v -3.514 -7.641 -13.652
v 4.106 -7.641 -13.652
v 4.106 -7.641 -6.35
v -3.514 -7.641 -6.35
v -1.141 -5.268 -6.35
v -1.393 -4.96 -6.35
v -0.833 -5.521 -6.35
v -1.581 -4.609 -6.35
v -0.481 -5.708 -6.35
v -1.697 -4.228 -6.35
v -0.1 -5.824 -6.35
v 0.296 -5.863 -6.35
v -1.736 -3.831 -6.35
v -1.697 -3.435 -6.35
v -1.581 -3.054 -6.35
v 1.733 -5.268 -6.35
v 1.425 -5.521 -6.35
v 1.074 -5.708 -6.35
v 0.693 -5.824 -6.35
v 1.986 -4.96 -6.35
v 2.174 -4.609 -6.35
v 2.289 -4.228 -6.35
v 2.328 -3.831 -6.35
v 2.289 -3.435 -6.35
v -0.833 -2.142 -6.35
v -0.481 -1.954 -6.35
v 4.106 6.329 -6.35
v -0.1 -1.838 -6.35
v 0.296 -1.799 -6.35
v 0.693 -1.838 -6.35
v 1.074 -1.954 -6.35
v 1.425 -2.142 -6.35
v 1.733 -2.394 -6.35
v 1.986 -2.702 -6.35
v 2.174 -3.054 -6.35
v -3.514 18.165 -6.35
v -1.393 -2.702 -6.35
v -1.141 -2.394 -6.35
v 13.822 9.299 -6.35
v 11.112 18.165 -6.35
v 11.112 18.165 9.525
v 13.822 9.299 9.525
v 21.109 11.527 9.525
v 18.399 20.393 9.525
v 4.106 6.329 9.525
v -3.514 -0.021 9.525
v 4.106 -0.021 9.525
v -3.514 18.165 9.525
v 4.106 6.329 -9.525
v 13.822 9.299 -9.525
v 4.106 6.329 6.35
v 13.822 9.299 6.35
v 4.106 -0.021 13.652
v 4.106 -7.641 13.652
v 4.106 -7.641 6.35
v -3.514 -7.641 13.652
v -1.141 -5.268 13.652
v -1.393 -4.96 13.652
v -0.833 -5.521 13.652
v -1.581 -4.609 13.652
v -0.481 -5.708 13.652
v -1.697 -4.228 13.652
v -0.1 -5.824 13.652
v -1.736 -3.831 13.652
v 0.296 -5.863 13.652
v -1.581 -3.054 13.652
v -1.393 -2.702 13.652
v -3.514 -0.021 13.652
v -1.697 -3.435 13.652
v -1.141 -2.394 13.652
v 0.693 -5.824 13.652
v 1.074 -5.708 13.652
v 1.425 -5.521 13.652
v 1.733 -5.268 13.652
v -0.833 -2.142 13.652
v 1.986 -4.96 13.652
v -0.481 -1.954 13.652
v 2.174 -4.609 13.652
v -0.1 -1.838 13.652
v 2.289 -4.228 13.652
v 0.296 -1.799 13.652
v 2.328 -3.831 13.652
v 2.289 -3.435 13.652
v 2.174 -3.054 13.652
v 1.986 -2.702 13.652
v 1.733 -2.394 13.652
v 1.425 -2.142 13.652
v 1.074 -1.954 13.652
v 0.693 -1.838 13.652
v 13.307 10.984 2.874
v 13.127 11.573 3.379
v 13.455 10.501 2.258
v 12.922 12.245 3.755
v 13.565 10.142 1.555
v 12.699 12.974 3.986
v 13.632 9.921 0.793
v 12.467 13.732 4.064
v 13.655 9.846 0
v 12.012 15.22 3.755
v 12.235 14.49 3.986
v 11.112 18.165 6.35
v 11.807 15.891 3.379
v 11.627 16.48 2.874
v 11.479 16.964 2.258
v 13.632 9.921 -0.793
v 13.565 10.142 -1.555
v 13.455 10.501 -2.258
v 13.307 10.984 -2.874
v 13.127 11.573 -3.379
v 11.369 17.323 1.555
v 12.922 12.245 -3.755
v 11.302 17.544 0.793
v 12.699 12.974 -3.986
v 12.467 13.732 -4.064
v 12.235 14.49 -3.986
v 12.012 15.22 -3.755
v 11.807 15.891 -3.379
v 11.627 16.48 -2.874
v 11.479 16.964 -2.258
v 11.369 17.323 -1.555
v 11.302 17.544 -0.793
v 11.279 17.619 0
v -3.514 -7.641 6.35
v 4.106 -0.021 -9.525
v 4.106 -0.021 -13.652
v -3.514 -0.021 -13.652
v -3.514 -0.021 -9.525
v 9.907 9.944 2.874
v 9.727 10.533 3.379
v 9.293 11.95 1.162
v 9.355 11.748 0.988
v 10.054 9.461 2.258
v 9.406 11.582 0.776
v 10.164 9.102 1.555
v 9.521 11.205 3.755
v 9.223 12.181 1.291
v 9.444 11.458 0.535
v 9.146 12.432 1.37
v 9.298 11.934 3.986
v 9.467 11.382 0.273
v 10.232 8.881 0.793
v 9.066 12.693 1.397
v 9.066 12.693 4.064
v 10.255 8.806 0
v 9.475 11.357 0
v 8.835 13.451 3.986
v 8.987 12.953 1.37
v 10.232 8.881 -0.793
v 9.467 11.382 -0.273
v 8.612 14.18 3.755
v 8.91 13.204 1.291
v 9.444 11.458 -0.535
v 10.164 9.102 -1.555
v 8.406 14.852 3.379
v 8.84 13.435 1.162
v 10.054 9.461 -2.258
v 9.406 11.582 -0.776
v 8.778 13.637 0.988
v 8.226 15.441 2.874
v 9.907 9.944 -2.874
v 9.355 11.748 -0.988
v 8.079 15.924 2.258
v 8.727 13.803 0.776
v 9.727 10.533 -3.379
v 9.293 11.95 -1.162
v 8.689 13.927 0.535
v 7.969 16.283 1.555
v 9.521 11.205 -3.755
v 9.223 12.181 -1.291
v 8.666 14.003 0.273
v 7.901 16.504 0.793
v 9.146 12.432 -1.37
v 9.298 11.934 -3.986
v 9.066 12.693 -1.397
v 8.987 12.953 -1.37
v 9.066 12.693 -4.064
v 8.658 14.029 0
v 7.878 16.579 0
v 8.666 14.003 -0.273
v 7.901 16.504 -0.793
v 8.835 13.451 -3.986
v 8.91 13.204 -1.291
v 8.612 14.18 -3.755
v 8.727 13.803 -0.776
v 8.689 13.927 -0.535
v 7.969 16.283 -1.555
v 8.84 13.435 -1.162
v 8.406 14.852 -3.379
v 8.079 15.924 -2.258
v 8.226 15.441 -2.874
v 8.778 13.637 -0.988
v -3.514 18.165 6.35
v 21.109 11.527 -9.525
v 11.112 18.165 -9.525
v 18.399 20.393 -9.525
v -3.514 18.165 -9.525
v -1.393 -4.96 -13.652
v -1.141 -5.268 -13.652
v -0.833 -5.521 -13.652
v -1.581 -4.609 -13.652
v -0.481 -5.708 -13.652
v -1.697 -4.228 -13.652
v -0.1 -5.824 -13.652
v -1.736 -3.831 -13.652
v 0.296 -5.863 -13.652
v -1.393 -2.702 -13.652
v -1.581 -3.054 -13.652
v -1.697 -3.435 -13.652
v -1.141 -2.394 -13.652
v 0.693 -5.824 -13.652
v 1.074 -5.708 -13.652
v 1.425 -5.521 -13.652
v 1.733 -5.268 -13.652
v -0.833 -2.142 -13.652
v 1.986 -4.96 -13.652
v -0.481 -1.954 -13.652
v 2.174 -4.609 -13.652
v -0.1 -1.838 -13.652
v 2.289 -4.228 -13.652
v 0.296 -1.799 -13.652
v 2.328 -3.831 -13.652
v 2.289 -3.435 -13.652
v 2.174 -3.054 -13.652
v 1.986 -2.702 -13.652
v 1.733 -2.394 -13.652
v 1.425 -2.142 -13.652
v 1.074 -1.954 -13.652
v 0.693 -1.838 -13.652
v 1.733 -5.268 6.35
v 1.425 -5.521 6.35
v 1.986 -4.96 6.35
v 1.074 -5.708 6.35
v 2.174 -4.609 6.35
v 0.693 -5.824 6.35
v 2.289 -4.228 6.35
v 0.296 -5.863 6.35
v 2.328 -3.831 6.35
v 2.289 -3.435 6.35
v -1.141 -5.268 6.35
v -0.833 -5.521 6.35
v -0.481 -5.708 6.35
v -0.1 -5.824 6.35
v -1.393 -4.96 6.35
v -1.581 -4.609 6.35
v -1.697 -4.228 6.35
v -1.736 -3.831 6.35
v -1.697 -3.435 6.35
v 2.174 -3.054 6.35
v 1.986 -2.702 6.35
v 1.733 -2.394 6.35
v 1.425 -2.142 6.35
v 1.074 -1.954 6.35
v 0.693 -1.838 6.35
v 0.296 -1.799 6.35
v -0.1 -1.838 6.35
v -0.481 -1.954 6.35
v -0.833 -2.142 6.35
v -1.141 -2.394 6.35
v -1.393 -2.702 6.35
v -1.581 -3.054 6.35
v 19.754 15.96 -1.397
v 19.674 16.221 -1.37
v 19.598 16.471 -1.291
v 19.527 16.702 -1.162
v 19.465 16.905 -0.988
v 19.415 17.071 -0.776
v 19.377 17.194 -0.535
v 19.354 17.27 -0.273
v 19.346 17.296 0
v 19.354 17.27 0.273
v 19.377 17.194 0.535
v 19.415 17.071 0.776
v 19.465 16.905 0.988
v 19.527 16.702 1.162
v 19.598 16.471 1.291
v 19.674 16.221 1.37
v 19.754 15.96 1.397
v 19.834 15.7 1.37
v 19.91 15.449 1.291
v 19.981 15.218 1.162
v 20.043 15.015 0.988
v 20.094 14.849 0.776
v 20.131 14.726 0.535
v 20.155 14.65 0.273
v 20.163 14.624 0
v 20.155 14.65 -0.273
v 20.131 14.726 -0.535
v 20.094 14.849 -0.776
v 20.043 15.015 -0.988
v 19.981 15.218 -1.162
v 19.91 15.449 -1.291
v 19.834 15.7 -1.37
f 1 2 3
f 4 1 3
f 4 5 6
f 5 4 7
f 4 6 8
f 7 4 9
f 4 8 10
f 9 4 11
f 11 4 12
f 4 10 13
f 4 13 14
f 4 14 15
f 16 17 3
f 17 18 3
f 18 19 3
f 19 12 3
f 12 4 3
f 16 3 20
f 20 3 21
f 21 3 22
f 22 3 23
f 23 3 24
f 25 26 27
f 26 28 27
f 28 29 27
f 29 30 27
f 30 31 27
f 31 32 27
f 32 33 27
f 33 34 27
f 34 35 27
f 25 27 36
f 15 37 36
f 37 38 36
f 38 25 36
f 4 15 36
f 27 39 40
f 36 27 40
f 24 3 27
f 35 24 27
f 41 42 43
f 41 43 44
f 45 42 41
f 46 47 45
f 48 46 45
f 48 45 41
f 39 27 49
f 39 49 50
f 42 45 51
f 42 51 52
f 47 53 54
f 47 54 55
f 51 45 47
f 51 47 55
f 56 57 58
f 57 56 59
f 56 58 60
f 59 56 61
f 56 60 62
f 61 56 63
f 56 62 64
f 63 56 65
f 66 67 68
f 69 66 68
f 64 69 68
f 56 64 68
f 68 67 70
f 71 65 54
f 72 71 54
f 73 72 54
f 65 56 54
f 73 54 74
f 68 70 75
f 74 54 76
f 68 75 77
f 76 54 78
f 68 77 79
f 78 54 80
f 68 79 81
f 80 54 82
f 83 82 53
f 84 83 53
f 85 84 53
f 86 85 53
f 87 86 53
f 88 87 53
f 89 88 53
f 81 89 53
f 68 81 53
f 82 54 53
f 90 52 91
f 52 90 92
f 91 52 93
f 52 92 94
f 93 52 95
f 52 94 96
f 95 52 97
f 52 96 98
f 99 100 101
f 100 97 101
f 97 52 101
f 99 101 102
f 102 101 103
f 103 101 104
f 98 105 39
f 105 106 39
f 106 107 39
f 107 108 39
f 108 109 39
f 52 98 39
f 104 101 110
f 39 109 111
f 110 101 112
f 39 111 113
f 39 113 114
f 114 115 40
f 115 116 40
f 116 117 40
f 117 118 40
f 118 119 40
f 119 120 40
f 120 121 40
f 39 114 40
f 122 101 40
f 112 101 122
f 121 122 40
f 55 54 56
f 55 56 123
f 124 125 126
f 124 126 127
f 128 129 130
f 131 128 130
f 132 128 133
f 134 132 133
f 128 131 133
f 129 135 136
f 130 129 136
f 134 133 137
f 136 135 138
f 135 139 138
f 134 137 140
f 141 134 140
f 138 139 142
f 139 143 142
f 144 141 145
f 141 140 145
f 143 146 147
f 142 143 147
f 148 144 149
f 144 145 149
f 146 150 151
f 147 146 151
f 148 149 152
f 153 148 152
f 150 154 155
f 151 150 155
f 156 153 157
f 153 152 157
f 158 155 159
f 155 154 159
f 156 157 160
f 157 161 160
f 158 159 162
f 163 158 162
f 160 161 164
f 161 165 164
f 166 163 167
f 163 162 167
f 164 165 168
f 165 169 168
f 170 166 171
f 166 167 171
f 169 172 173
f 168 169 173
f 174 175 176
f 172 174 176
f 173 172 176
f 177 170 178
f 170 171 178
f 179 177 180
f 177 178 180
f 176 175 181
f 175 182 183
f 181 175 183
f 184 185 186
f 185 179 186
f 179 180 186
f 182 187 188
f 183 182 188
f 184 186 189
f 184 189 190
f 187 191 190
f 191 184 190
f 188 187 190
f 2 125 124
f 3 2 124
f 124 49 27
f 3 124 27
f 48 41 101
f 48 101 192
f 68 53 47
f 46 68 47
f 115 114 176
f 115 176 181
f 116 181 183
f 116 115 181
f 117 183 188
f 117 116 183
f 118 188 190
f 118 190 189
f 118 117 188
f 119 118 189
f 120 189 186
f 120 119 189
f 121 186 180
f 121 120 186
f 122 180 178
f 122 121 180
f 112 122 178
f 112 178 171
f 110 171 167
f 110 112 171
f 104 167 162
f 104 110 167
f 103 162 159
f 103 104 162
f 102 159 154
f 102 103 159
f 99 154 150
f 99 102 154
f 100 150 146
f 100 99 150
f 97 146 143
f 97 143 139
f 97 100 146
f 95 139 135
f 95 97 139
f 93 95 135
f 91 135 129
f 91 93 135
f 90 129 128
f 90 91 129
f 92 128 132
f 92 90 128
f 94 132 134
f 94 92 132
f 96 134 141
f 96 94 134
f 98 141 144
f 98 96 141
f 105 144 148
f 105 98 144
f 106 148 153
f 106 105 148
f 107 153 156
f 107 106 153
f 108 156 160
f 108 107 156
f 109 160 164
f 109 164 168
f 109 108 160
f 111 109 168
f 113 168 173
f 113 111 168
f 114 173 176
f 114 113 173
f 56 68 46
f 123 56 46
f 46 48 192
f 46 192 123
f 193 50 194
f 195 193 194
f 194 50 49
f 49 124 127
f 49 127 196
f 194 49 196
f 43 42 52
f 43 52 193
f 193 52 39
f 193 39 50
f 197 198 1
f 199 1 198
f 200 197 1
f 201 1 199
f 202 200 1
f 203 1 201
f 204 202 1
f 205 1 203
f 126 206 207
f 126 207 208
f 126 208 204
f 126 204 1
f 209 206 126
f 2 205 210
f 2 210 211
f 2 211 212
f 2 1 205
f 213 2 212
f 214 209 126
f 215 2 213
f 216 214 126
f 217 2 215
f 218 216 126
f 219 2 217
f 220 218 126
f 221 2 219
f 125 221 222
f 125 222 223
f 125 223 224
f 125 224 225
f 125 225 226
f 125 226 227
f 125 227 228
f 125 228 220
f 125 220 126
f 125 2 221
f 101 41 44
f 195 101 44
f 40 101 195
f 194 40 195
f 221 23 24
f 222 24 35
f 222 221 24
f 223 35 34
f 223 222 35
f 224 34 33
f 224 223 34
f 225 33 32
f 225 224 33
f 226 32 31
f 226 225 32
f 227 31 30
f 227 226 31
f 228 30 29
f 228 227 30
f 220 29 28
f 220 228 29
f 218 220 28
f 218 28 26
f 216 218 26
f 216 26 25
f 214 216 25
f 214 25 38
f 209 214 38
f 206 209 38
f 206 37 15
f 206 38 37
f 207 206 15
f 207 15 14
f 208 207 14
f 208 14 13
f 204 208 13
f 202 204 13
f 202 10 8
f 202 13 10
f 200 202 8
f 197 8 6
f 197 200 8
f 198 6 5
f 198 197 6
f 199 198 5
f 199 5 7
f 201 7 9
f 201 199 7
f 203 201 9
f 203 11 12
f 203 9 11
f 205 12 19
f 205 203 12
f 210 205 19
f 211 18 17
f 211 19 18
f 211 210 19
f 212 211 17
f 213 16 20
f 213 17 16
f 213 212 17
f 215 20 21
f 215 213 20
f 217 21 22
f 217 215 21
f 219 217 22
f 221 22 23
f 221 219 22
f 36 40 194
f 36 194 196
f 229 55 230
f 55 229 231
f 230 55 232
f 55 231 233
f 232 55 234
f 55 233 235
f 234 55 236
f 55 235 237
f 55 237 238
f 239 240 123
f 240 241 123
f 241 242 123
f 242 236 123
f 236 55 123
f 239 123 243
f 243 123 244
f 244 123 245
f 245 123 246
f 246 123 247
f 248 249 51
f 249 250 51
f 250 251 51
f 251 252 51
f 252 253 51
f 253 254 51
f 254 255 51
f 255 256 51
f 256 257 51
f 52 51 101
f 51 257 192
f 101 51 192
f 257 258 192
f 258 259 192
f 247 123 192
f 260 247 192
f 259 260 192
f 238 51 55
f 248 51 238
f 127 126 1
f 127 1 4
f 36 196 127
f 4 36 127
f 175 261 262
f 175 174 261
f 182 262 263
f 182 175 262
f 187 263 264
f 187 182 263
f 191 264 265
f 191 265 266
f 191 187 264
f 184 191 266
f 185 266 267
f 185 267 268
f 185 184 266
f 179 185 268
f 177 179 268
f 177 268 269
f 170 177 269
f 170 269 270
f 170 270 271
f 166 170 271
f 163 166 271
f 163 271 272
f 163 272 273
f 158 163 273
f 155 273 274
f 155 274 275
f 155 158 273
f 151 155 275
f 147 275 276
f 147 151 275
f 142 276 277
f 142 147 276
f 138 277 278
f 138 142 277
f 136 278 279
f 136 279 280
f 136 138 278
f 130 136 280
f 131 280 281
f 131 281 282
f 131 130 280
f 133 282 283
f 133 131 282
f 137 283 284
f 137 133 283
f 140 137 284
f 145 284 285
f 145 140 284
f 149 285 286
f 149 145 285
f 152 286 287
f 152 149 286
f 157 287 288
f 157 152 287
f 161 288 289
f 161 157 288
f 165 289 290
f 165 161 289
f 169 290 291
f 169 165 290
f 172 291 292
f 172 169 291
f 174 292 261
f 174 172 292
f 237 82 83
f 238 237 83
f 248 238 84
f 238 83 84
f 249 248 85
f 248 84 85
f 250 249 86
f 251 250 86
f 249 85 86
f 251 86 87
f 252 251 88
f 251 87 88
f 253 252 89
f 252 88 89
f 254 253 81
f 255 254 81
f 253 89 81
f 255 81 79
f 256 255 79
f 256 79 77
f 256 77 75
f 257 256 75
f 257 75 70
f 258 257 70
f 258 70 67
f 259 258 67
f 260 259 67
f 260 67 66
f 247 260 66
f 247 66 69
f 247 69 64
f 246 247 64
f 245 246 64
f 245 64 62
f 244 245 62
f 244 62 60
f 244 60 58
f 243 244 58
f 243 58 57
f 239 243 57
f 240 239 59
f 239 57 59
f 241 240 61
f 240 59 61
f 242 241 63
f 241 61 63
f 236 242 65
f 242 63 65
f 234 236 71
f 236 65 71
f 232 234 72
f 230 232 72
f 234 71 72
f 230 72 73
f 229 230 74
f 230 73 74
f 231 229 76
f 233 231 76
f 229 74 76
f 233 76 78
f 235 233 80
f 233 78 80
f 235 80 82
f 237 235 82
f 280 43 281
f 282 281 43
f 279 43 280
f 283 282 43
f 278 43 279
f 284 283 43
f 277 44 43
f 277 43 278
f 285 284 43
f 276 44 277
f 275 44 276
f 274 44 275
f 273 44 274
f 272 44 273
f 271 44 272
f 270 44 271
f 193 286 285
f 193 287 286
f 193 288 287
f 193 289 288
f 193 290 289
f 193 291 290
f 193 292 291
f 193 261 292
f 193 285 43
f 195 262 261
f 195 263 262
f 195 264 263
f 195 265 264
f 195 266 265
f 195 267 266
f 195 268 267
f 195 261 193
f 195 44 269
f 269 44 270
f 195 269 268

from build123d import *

# Parameters (mm, degrees)
BOSS_EXTRUDE1_DEPTH     = 9.525
SKETCH2_W               = 12.7
SKETCH2_H               = 25.806397913
CUT_EXTRUDE1_DEPTH      = 14.822389654
CUT_EXTRUDE1_DEPTH_BACK = 4.513666667
SKETCH3_W               = 19.05
SKETCH3_H               = 9.271
SKETCH3_R               = 1.397
BOSS_EXTRUDE2_DEPTH     = 7.62
SKETCH3_3_R             = 4.064
SKETCH3_3_R_2           = 1.397
BOSS_EXTRUDE3_DEPTH     = 3.556
SKETCH4_W               = 4.1275
SKETCH4_H               = 7.62
BOSS_EXTRUDE4_DEPTH     = 7.62
SKETCH5_R               = 2.032
CUT_EXTRUDE2_DEPTH      = 20.0025


with BuildPart() as part:
    # Sketch1 → Boss-Extrude1 (new body, symmetric)
    with BuildSketch(Plane.XY):
        Polygon((-3.513666667, -7.641166667), (4.106333333, -7.641166667), (4.106333333, 6.328833333), (13.822389654, 9.299329853), (11.111811579, 18.165231246), (-3.513666667, 18.165231246), align=None)
    extrude(amount=BOSS_EXTRUDE1_DEPTH, both=True)

    # Sketch2 → Cut-Extrude1 (cut, two sides)
    with BuildSketch(Plane(origin=(0, 0, 0), x_dir=(0, 0, -1), z_dir=(1, 0, 0))) as cut_extrude1_sk:
        with Locations((0, 5.26203229)):
            Rectangle(SKETCH2_W, SKETCH2_H)
    extrude(amount=CUT_EXTRUDE1_DEPTH, mode=Mode.SUBTRACT)
    extrude(cut_extrude1_sk.sketch, amount=-CUT_EXTRUDE1_DEPTH_BACK, mode=Mode.SUBTRACT)

    # Sketch3 → Boss-Extrude2 (add)
    with BuildSketch(Plane(origin=(15.24089464, 4.659609104, 0), x_dir=(0, 0, -1), z_dir=(0.956304756, 0.292371705, 0))):
        with Locations((0, 9.48721774)):
            Rectangle(SKETCH3_W, SKETCH3_H)
        with Locations((0, 9.48721774)):
            Circle(SKETCH3_R, mode=Mode.SUBTRACT)
    extrude(amount=BOSS_EXTRUDE2_DEPTH)

    # Sketch3<3> → Boss-Extrude3 (add)
    with BuildSketch(Plane(origin=(15.24089464, 4.659609104, 0), x_dir=(0, 0, -1), z_dir=(0.956304756, 0.292371705, 0))):
        with Locations((0, 9.48721774)):
            Circle(SKETCH3_3_R)
        with Locations((0, 9.48721774)):
            Circle(SKETCH3_3_R_2, mode=Mode.SUBTRACT)
    extrude(amount=-BOSS_EXTRUDE3_DEPTH)

    # Sketch4 → Boss-Extrude4 (add)
    with BuildSketch(Plane(origin=(4.106333333, 0, 0), x_dir=(0, 0, -1), z_dir=(1, 0, 0))):
        with Locations((-11.58875, -3.831166667)):
            Rectangle(SKETCH4_W, SKETCH4_H)
    boss_extrude4 = extrude(amount=-BOSS_EXTRUDE4_DEPTH)

    # Sketch5 → Cut-Extrude2 (cut)
    with BuildSketch(Plane.XY.offset(13.6525)):
        with Locations((0.296333333, -3.831166667)):
            Circle(SKETCH5_R)
    cut_extrude2 = extrude(amount=-CUT_EXTRUDE2_DEPTH, mode=Mode.SUBTRACT)

    # Mirror1: Boss-Extrude4, Cut-Extrude2 across plane
    add(boss_extrude4.mirror(Plane.XY))
    add(cut_extrude2.mirror(Plane.XY), mode=Mode.SUBTRACT)


solid = part.part
